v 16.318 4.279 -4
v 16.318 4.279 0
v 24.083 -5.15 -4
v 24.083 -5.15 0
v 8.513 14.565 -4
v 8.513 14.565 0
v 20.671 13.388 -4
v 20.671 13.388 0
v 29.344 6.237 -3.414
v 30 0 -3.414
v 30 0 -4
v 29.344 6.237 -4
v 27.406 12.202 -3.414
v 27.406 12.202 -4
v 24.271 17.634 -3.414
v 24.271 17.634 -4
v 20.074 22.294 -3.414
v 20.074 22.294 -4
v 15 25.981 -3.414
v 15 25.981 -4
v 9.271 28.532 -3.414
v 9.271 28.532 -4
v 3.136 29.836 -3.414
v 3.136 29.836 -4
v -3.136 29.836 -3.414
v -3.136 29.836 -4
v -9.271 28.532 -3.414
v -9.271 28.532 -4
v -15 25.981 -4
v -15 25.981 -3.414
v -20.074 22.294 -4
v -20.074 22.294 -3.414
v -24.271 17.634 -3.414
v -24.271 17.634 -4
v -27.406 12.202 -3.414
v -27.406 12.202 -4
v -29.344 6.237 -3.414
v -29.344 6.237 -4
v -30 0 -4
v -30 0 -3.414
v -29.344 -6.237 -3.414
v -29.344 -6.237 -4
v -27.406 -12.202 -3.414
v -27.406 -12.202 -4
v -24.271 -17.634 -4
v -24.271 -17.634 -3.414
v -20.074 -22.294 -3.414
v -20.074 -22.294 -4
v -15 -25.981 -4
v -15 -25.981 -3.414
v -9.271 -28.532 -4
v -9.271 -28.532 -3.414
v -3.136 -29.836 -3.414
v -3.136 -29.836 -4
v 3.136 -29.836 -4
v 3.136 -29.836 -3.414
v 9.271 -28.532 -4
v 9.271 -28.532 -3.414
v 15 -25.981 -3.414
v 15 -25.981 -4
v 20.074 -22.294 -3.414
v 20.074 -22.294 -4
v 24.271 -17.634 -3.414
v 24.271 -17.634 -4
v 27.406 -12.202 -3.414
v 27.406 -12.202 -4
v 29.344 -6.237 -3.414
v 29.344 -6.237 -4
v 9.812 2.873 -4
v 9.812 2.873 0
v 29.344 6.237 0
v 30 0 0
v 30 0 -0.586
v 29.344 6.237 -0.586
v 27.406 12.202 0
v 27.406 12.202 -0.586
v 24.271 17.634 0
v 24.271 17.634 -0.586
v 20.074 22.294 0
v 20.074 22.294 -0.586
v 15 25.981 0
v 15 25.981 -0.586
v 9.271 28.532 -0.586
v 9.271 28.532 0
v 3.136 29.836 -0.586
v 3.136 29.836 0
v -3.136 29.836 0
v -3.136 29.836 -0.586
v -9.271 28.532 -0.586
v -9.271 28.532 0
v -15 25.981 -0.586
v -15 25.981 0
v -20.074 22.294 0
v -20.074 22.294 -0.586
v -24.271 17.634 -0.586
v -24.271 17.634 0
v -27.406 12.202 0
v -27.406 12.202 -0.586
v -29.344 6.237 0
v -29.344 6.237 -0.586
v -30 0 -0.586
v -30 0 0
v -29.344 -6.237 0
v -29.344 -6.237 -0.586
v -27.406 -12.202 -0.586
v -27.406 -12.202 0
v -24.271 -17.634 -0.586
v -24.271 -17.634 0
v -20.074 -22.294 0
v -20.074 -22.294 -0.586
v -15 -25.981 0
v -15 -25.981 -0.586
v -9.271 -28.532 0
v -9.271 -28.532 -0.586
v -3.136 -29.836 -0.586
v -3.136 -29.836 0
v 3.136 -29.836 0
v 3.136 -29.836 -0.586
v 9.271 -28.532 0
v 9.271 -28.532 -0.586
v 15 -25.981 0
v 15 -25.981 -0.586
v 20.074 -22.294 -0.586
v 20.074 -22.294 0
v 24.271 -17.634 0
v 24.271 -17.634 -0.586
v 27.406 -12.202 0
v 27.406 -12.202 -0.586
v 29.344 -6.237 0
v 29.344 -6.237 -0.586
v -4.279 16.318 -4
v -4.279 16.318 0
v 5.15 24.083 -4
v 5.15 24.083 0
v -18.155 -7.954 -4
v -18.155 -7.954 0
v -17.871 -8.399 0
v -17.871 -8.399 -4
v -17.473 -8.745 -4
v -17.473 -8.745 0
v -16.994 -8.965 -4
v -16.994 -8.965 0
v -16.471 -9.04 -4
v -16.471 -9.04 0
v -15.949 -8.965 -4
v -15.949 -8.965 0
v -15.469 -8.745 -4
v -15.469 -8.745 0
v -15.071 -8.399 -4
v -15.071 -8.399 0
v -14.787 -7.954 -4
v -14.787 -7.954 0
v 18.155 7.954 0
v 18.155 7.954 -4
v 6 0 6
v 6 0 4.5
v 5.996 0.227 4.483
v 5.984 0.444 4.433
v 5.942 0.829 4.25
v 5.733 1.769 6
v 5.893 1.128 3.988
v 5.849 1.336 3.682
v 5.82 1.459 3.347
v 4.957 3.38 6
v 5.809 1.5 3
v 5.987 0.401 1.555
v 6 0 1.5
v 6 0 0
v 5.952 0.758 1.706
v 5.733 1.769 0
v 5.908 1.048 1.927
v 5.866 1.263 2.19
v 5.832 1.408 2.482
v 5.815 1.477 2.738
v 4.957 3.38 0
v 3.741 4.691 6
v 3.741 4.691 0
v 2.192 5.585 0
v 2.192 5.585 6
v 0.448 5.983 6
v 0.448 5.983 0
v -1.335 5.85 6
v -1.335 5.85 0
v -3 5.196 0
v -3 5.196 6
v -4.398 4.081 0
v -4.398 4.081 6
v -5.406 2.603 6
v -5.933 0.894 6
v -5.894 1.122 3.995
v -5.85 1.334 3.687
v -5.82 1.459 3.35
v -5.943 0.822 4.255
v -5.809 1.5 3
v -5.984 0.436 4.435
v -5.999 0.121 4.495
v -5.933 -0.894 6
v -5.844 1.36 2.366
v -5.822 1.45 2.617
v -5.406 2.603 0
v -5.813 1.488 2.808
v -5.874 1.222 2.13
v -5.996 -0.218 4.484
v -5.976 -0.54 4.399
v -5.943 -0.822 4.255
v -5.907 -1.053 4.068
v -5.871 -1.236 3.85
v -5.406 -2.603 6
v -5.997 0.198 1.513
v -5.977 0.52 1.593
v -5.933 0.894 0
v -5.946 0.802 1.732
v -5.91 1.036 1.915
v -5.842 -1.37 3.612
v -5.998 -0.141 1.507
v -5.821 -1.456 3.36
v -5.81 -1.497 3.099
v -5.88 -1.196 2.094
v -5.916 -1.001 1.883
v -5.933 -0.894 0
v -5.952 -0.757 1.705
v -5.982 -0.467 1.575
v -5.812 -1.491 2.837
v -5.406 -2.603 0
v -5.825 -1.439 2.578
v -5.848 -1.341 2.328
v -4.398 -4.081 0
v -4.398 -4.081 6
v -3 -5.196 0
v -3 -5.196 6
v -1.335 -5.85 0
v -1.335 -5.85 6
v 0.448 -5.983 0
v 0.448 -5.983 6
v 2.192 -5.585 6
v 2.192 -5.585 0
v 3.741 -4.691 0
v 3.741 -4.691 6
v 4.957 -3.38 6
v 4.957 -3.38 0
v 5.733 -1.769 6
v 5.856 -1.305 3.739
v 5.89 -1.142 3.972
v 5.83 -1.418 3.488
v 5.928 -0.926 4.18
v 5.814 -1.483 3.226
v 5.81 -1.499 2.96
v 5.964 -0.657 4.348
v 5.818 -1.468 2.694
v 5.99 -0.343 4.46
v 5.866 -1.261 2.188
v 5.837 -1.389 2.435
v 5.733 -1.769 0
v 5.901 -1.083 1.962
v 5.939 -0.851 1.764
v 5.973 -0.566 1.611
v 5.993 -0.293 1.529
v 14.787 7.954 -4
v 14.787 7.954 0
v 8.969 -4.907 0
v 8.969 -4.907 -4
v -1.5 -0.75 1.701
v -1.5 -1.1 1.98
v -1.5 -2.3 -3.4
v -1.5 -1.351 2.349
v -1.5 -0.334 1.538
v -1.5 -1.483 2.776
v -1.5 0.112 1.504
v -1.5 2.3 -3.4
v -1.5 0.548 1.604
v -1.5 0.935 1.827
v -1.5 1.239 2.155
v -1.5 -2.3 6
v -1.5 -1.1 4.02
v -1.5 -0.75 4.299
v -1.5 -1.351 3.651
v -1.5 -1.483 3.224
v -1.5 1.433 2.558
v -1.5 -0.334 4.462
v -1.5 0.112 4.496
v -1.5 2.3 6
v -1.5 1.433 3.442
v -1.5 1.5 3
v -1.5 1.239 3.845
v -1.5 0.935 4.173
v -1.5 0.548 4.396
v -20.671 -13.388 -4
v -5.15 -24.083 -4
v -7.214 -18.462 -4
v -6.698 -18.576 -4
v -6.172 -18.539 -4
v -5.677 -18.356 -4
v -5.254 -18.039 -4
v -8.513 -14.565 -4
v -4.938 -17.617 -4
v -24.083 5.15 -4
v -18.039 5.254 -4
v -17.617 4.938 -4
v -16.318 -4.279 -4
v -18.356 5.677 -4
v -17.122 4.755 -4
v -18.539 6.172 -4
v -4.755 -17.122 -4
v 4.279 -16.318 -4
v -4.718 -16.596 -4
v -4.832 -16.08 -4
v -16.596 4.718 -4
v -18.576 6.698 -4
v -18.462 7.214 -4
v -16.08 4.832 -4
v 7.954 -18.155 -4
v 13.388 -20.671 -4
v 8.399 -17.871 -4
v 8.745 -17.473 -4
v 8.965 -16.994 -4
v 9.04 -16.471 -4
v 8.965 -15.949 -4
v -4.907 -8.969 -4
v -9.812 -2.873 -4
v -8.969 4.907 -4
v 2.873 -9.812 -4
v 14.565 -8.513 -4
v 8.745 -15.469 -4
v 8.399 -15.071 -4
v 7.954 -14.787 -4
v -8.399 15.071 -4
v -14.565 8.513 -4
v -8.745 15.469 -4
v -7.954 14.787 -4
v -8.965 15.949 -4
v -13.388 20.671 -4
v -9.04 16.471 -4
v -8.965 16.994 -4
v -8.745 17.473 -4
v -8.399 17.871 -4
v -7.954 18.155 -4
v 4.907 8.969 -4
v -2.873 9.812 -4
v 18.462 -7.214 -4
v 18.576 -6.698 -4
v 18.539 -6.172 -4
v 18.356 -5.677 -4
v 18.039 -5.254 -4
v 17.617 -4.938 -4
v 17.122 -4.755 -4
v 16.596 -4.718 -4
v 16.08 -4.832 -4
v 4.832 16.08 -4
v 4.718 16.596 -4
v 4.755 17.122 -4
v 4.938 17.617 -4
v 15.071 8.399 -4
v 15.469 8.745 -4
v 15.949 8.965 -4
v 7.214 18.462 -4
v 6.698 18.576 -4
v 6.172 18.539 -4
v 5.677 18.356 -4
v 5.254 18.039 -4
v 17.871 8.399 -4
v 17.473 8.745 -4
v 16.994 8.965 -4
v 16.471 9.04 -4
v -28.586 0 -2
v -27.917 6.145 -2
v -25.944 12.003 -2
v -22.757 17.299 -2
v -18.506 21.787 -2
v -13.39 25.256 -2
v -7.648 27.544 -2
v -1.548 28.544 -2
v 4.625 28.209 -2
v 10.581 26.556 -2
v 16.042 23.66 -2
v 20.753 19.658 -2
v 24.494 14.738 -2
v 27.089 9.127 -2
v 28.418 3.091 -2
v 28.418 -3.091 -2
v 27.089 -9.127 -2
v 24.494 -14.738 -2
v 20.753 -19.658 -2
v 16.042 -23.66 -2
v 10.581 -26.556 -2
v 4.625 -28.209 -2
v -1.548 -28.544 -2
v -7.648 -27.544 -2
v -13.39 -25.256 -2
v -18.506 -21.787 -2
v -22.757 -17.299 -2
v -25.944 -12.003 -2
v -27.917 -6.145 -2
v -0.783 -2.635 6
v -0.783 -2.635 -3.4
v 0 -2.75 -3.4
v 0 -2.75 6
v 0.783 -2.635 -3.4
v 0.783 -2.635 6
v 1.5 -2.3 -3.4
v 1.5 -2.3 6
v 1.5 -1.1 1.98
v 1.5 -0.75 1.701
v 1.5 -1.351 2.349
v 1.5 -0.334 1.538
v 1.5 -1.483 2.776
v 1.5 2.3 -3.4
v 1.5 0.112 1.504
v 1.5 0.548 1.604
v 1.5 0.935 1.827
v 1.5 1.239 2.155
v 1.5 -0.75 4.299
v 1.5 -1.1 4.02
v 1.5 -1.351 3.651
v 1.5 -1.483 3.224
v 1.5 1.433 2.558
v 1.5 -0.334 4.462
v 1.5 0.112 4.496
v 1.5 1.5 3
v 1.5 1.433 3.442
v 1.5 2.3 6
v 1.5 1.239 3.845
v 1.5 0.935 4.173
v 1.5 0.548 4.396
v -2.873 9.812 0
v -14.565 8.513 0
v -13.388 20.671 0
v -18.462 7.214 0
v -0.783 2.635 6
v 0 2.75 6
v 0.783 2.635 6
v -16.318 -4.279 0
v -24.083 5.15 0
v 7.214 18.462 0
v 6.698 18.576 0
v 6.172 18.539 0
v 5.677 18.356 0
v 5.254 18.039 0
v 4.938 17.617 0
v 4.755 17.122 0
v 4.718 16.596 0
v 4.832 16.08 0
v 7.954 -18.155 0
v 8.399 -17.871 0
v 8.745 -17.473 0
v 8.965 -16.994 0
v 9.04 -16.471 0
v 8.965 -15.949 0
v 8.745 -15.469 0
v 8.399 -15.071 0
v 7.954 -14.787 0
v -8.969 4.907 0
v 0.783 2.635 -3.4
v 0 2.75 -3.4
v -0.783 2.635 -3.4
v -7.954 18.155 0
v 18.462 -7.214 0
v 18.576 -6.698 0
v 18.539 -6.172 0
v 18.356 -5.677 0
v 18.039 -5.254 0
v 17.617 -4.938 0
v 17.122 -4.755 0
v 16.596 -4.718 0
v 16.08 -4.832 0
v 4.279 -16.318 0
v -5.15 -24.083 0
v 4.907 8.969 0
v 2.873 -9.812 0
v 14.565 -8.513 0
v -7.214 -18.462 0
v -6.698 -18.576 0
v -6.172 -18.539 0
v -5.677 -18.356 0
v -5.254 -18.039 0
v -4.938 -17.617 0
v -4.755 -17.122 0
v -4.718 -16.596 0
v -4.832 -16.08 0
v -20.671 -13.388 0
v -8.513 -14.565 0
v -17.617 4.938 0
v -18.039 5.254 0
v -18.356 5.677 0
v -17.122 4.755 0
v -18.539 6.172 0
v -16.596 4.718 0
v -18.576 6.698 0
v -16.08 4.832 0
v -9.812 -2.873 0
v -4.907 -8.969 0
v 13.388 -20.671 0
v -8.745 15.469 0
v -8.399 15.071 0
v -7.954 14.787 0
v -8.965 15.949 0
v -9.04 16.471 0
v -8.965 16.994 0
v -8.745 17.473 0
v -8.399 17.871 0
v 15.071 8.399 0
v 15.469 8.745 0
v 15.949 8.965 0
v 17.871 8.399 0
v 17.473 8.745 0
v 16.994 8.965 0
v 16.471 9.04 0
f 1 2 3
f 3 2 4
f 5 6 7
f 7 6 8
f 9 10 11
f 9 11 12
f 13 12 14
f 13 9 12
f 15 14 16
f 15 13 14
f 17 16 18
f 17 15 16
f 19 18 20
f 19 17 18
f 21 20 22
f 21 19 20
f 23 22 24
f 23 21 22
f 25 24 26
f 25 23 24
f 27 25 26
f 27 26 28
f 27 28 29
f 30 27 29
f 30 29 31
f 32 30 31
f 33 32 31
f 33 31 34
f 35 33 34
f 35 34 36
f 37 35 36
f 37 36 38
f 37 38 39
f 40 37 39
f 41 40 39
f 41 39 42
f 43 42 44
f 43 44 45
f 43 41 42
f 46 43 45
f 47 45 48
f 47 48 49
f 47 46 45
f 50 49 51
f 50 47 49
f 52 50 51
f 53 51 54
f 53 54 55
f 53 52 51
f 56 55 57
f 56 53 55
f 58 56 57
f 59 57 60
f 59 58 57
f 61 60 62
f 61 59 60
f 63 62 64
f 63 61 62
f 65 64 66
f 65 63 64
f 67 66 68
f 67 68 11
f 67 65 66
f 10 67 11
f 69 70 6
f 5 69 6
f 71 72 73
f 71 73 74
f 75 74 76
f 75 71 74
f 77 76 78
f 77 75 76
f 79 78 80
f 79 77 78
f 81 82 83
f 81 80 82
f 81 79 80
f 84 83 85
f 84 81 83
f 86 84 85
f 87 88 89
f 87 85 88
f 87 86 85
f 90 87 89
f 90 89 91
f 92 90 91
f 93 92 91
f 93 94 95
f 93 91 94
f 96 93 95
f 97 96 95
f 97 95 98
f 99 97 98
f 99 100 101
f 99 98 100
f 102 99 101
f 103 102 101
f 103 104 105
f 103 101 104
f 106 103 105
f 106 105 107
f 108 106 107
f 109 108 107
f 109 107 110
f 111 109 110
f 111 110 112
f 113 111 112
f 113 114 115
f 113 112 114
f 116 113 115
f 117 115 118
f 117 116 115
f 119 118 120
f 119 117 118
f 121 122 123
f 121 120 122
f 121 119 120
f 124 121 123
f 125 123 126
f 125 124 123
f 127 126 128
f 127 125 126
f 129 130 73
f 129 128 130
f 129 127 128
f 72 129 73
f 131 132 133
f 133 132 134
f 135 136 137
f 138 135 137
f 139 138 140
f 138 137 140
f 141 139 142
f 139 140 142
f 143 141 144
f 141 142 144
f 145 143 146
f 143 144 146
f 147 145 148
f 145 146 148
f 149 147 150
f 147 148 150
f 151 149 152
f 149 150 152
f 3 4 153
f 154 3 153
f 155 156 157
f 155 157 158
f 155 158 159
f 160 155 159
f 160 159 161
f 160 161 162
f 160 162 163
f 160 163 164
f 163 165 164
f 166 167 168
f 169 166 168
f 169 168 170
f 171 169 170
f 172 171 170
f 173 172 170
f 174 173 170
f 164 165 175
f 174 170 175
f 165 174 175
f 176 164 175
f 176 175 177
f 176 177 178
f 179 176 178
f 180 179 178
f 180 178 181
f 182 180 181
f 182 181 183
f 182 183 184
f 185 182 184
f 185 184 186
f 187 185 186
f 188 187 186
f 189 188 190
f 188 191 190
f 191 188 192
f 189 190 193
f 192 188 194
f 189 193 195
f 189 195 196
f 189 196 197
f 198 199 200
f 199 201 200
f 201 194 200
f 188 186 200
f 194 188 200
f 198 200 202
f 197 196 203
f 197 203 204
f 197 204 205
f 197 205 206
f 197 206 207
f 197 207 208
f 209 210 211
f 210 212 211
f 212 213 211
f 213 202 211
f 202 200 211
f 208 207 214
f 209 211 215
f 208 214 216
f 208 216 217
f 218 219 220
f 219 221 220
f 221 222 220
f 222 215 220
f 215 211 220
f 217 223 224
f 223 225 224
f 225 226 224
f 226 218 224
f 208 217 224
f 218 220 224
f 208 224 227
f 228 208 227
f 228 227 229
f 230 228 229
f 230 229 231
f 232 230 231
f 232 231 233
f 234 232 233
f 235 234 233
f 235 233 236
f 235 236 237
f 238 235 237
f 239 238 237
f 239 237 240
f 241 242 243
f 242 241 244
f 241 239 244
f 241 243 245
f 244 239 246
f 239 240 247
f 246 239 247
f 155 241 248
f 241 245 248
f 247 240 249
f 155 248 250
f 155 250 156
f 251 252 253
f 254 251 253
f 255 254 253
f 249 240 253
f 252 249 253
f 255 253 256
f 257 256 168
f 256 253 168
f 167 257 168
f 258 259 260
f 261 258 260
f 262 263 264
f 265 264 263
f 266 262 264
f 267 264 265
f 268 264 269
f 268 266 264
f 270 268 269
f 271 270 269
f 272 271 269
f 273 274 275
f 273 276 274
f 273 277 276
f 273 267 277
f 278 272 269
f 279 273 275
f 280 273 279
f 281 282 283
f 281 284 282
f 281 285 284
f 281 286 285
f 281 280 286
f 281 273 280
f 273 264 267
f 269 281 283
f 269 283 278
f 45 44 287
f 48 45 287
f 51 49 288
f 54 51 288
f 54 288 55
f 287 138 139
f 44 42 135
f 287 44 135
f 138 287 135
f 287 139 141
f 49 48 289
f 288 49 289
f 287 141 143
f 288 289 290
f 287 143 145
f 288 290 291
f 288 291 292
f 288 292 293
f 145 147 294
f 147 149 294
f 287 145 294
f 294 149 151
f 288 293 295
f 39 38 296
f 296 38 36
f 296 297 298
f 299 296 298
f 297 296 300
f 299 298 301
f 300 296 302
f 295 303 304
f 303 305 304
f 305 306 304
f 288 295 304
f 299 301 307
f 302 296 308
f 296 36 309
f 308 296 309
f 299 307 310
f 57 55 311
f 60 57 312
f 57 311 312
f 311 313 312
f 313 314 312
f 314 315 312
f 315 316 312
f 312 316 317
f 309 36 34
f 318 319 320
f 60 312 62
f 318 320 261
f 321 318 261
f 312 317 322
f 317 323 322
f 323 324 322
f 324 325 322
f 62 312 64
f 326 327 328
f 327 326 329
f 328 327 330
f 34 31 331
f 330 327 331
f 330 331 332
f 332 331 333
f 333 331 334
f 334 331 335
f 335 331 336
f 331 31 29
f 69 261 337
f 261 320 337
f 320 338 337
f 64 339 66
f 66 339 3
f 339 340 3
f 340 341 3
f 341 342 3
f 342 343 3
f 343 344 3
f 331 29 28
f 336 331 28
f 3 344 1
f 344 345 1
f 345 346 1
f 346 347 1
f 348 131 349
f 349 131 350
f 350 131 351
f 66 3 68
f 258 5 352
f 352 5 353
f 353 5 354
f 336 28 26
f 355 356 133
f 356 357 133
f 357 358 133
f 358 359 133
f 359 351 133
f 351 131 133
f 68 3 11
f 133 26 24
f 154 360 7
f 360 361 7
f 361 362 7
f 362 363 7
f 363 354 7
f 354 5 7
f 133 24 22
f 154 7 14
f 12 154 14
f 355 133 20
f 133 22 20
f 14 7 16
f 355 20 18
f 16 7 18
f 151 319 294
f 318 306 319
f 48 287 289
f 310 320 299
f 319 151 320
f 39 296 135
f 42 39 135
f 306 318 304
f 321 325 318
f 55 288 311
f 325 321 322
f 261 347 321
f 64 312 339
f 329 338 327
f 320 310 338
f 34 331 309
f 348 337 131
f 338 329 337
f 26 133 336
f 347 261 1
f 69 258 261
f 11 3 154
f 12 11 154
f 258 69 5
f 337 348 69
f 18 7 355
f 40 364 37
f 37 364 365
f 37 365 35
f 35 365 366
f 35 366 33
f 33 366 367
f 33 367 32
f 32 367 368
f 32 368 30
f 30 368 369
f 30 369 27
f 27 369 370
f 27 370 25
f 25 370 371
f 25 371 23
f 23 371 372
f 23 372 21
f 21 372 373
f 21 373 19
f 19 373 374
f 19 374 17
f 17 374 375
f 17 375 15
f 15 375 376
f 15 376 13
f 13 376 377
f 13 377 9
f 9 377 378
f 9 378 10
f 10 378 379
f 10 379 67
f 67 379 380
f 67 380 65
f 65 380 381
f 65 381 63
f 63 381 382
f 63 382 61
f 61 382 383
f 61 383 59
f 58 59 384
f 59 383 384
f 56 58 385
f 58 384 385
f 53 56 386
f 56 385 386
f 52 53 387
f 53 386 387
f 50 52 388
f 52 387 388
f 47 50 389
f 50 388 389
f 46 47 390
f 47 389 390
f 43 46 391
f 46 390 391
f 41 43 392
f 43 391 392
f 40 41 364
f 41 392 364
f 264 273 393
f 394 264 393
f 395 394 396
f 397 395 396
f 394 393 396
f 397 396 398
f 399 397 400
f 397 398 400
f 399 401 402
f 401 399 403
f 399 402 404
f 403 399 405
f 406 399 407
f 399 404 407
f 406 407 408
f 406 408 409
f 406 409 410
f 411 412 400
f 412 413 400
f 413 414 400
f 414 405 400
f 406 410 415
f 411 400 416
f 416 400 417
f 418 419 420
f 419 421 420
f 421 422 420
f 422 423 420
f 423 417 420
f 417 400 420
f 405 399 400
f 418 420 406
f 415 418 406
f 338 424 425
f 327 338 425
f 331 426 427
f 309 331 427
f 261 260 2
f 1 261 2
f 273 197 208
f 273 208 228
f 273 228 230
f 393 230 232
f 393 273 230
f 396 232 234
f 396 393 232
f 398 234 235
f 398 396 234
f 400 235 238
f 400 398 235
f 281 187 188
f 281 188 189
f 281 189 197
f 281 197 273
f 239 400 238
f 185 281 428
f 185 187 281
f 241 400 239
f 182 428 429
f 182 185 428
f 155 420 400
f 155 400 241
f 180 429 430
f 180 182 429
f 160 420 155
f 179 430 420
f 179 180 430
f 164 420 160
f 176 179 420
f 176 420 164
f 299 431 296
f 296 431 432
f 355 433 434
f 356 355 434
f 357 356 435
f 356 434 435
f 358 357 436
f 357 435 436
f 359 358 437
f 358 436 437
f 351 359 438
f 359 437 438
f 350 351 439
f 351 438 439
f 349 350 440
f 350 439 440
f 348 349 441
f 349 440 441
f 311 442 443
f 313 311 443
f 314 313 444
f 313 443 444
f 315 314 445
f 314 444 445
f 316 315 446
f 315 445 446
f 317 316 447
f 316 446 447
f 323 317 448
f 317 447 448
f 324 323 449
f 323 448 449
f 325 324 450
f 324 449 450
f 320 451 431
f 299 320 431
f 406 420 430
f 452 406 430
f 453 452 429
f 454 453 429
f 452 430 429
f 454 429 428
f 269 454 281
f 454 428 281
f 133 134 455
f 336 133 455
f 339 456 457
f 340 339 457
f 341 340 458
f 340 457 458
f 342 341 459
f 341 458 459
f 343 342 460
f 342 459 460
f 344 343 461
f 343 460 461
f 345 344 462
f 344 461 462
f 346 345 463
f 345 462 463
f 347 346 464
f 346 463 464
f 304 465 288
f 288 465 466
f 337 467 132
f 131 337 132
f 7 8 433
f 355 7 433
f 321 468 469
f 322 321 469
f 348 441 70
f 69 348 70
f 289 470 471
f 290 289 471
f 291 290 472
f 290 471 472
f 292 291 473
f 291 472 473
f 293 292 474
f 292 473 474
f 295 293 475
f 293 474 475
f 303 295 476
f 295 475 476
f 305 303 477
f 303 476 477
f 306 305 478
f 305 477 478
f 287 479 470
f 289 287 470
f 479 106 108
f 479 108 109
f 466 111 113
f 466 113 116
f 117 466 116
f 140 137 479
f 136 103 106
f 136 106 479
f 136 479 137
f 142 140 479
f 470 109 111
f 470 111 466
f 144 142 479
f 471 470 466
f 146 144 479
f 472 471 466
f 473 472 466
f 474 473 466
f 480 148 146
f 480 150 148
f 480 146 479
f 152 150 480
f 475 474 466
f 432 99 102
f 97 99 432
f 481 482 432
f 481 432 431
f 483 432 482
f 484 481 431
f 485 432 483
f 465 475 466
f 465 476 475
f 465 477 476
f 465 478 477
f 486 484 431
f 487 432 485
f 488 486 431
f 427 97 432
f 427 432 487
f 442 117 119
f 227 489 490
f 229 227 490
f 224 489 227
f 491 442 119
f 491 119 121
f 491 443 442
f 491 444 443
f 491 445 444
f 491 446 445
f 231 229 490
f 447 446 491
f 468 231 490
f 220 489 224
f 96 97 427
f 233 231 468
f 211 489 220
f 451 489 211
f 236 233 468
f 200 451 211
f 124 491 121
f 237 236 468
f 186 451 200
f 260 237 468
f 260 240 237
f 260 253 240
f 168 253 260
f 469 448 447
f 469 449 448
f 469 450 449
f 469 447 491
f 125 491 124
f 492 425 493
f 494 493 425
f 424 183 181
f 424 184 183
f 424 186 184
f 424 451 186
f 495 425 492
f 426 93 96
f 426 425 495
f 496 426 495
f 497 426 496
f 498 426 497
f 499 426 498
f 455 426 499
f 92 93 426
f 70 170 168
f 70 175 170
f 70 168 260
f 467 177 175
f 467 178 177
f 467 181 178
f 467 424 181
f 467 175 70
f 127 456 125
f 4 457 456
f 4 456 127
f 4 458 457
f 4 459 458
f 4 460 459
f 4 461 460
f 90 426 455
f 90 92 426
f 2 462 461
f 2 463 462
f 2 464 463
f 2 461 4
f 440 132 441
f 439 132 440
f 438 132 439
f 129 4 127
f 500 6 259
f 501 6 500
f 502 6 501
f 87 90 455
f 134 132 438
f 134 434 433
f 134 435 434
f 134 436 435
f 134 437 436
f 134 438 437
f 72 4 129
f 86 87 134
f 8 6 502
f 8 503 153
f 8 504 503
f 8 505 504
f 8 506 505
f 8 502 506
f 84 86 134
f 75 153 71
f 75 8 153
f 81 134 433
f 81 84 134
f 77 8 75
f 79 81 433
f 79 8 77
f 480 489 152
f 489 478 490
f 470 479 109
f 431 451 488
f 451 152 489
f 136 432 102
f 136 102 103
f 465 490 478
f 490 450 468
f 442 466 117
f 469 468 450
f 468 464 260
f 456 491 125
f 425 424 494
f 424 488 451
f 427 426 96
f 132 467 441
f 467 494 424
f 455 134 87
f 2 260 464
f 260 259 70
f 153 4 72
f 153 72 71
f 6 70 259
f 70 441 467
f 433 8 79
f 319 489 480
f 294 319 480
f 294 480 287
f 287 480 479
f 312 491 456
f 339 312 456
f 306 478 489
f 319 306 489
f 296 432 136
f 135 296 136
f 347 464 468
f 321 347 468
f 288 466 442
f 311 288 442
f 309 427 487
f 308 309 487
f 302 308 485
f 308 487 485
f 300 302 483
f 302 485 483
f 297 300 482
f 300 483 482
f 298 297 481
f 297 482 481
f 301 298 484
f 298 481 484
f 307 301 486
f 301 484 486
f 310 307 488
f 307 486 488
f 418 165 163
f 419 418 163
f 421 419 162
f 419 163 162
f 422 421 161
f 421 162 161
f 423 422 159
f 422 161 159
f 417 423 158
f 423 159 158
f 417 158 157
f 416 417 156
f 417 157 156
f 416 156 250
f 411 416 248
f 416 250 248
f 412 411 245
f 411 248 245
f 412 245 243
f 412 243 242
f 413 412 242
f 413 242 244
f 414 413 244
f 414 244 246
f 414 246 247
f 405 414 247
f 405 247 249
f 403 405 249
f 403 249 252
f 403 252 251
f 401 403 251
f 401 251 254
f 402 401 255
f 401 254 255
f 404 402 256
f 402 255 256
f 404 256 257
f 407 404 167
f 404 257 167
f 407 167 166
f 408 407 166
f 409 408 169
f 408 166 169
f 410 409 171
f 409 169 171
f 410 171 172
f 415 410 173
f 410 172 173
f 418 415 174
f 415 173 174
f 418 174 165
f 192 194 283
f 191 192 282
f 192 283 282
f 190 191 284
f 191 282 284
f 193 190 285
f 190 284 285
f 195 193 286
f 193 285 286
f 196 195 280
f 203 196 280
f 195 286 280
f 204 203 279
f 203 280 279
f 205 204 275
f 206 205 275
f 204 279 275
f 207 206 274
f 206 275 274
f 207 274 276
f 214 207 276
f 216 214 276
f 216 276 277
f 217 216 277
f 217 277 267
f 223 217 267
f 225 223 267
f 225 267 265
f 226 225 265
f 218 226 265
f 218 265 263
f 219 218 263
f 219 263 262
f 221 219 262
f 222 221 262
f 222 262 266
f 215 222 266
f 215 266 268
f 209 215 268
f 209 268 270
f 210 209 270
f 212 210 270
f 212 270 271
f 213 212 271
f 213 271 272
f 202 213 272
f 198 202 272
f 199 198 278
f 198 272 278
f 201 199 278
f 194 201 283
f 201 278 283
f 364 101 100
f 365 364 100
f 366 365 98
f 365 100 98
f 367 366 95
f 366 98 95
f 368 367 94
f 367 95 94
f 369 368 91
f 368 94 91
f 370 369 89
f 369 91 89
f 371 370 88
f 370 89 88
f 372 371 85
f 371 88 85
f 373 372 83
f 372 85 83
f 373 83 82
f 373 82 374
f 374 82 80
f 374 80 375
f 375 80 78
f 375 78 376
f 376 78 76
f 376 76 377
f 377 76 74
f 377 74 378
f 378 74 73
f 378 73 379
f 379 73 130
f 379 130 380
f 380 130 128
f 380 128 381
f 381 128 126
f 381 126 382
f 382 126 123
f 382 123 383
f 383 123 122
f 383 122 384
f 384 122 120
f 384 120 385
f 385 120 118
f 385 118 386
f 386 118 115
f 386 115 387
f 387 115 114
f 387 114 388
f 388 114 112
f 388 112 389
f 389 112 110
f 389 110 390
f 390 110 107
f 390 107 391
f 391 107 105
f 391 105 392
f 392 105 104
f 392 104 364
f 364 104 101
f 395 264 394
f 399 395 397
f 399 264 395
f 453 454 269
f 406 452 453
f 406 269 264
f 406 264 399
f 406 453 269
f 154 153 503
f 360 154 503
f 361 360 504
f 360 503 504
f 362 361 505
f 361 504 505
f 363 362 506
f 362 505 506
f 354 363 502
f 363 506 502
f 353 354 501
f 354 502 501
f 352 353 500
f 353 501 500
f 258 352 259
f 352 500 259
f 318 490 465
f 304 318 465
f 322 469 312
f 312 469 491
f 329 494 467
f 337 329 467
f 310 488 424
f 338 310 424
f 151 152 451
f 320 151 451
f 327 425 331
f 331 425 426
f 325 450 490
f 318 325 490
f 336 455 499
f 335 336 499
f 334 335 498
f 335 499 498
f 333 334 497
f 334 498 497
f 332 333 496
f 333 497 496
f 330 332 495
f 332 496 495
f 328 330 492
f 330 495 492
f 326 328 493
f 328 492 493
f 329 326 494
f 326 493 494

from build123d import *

# Parameters (mm, degrees)
F0_R             = 30
F0_R_2           = 6
F1_DEPTH         = 4
F2_DEPTH         = 6
F3_W             = 3
F3_H             = 4.6
F4_DEPTH         = 9.4
F8_R             = 1.5
F9_DEPTH         = 49.2
F11_DEPTH        = 4
F11_COPIES_COUNT = 8


# Not quite as in the source:
# - a pattern or mirror of a feature is missing from the dataset's text; its kind, count and spacing are read off the source's solid


with BuildPart() as f1:
    # F0 (on Top) → F1 (new body)
    with BuildSketch(Plane.XY):
        Circle(F0_R)
        Circle(F0_R_2, mode=Mode.SUBTRACT)
        Circle(F0_R_2)
    extrude(amount=-F1_DEPTH)

    # F0 (on Top) → F2 (join)
    with BuildSketch(Plane.XY):
        Circle(F0_R_2)
    extrude(amount=F2_DEPTH)

    # F3 (on face) → F4 (cut)
    with BuildSketch(Plane.XY.offset(6)):
        with BuildLine():
            Line((1.5, -2.3), (-1.5, -2.3))
            ThreePointArc((-1.5, -2.3), (0, -2.75), (1.5, -2.3))
        make_face()
        Rectangle(F3_W, F3_H)
        with BuildLine():
            ThreePointArc((1.5, 2.3), (0, 2.75), (-1.5, 2.3))
            Line((-1.5, 2.3), (1.5, 2.3))
        make_face()
    extrude(amount=-F4_DEPTH, mode=Mode.SUBTRACT)

    # F5 (on Front) → F6 (revolve, cut)
    with BuildSketch(Plane.XZ):
        Polygon((-30, -0.5857864376), (-30, -3.4142135624), (-28.5857864376, -2), align=None)
    revolve(axis=Axis((0, 0, -0.1510307193), (0, 0, -1)), mode=Mode.SUBTRACT)

    # F8 (on offset) → F9 (cut)
    with BuildSketch(Plane.YZ.offset(25)):
        with Locations((0, 3)):
            Circle(F8_R)
    extrude(amount=-F9_DEPTH, mode=Mode.SUBTRACT)

    # F10 (on face) → F11 (cut, through all)
    with BuildSketch(Plane.XY):
        with BuildLine():
            Line((-4.2793955654, 16.3180977106), (5.1502715485, 24.0833689493))
            Line((5.1502715485, 24.0833689493), (-7.9538393766, 18.1553196162))
            ThreePointArc((-7.9538393766, 18.1553196162), (-9.040407042, 16.47119876), (-7.9538393766, 14.7870779037))
            Line((-7.9538393766, 14.7870779037), (4.9067144282, 8.9692091569))
            Line((4.9067144282, 8.9692091569), (-4.2793955654, 16.3180977106))
        make_face()
    f11 = extrude(amount=-F11_DEPTH, mode=Mode.SUBTRACT)

    # F11_copies: F11 ×8 about axis
    f11_copies_axis = Axis((0, 0, 0), (0, 0, 1))
    for i in range(1, F11_COPIES_COUNT):
        add(f11.rotate(f11_copies_axis, i * 360 / F11_COPIES_COUNT), mode=Mode.SUBTRACT)


solid = f1.part
